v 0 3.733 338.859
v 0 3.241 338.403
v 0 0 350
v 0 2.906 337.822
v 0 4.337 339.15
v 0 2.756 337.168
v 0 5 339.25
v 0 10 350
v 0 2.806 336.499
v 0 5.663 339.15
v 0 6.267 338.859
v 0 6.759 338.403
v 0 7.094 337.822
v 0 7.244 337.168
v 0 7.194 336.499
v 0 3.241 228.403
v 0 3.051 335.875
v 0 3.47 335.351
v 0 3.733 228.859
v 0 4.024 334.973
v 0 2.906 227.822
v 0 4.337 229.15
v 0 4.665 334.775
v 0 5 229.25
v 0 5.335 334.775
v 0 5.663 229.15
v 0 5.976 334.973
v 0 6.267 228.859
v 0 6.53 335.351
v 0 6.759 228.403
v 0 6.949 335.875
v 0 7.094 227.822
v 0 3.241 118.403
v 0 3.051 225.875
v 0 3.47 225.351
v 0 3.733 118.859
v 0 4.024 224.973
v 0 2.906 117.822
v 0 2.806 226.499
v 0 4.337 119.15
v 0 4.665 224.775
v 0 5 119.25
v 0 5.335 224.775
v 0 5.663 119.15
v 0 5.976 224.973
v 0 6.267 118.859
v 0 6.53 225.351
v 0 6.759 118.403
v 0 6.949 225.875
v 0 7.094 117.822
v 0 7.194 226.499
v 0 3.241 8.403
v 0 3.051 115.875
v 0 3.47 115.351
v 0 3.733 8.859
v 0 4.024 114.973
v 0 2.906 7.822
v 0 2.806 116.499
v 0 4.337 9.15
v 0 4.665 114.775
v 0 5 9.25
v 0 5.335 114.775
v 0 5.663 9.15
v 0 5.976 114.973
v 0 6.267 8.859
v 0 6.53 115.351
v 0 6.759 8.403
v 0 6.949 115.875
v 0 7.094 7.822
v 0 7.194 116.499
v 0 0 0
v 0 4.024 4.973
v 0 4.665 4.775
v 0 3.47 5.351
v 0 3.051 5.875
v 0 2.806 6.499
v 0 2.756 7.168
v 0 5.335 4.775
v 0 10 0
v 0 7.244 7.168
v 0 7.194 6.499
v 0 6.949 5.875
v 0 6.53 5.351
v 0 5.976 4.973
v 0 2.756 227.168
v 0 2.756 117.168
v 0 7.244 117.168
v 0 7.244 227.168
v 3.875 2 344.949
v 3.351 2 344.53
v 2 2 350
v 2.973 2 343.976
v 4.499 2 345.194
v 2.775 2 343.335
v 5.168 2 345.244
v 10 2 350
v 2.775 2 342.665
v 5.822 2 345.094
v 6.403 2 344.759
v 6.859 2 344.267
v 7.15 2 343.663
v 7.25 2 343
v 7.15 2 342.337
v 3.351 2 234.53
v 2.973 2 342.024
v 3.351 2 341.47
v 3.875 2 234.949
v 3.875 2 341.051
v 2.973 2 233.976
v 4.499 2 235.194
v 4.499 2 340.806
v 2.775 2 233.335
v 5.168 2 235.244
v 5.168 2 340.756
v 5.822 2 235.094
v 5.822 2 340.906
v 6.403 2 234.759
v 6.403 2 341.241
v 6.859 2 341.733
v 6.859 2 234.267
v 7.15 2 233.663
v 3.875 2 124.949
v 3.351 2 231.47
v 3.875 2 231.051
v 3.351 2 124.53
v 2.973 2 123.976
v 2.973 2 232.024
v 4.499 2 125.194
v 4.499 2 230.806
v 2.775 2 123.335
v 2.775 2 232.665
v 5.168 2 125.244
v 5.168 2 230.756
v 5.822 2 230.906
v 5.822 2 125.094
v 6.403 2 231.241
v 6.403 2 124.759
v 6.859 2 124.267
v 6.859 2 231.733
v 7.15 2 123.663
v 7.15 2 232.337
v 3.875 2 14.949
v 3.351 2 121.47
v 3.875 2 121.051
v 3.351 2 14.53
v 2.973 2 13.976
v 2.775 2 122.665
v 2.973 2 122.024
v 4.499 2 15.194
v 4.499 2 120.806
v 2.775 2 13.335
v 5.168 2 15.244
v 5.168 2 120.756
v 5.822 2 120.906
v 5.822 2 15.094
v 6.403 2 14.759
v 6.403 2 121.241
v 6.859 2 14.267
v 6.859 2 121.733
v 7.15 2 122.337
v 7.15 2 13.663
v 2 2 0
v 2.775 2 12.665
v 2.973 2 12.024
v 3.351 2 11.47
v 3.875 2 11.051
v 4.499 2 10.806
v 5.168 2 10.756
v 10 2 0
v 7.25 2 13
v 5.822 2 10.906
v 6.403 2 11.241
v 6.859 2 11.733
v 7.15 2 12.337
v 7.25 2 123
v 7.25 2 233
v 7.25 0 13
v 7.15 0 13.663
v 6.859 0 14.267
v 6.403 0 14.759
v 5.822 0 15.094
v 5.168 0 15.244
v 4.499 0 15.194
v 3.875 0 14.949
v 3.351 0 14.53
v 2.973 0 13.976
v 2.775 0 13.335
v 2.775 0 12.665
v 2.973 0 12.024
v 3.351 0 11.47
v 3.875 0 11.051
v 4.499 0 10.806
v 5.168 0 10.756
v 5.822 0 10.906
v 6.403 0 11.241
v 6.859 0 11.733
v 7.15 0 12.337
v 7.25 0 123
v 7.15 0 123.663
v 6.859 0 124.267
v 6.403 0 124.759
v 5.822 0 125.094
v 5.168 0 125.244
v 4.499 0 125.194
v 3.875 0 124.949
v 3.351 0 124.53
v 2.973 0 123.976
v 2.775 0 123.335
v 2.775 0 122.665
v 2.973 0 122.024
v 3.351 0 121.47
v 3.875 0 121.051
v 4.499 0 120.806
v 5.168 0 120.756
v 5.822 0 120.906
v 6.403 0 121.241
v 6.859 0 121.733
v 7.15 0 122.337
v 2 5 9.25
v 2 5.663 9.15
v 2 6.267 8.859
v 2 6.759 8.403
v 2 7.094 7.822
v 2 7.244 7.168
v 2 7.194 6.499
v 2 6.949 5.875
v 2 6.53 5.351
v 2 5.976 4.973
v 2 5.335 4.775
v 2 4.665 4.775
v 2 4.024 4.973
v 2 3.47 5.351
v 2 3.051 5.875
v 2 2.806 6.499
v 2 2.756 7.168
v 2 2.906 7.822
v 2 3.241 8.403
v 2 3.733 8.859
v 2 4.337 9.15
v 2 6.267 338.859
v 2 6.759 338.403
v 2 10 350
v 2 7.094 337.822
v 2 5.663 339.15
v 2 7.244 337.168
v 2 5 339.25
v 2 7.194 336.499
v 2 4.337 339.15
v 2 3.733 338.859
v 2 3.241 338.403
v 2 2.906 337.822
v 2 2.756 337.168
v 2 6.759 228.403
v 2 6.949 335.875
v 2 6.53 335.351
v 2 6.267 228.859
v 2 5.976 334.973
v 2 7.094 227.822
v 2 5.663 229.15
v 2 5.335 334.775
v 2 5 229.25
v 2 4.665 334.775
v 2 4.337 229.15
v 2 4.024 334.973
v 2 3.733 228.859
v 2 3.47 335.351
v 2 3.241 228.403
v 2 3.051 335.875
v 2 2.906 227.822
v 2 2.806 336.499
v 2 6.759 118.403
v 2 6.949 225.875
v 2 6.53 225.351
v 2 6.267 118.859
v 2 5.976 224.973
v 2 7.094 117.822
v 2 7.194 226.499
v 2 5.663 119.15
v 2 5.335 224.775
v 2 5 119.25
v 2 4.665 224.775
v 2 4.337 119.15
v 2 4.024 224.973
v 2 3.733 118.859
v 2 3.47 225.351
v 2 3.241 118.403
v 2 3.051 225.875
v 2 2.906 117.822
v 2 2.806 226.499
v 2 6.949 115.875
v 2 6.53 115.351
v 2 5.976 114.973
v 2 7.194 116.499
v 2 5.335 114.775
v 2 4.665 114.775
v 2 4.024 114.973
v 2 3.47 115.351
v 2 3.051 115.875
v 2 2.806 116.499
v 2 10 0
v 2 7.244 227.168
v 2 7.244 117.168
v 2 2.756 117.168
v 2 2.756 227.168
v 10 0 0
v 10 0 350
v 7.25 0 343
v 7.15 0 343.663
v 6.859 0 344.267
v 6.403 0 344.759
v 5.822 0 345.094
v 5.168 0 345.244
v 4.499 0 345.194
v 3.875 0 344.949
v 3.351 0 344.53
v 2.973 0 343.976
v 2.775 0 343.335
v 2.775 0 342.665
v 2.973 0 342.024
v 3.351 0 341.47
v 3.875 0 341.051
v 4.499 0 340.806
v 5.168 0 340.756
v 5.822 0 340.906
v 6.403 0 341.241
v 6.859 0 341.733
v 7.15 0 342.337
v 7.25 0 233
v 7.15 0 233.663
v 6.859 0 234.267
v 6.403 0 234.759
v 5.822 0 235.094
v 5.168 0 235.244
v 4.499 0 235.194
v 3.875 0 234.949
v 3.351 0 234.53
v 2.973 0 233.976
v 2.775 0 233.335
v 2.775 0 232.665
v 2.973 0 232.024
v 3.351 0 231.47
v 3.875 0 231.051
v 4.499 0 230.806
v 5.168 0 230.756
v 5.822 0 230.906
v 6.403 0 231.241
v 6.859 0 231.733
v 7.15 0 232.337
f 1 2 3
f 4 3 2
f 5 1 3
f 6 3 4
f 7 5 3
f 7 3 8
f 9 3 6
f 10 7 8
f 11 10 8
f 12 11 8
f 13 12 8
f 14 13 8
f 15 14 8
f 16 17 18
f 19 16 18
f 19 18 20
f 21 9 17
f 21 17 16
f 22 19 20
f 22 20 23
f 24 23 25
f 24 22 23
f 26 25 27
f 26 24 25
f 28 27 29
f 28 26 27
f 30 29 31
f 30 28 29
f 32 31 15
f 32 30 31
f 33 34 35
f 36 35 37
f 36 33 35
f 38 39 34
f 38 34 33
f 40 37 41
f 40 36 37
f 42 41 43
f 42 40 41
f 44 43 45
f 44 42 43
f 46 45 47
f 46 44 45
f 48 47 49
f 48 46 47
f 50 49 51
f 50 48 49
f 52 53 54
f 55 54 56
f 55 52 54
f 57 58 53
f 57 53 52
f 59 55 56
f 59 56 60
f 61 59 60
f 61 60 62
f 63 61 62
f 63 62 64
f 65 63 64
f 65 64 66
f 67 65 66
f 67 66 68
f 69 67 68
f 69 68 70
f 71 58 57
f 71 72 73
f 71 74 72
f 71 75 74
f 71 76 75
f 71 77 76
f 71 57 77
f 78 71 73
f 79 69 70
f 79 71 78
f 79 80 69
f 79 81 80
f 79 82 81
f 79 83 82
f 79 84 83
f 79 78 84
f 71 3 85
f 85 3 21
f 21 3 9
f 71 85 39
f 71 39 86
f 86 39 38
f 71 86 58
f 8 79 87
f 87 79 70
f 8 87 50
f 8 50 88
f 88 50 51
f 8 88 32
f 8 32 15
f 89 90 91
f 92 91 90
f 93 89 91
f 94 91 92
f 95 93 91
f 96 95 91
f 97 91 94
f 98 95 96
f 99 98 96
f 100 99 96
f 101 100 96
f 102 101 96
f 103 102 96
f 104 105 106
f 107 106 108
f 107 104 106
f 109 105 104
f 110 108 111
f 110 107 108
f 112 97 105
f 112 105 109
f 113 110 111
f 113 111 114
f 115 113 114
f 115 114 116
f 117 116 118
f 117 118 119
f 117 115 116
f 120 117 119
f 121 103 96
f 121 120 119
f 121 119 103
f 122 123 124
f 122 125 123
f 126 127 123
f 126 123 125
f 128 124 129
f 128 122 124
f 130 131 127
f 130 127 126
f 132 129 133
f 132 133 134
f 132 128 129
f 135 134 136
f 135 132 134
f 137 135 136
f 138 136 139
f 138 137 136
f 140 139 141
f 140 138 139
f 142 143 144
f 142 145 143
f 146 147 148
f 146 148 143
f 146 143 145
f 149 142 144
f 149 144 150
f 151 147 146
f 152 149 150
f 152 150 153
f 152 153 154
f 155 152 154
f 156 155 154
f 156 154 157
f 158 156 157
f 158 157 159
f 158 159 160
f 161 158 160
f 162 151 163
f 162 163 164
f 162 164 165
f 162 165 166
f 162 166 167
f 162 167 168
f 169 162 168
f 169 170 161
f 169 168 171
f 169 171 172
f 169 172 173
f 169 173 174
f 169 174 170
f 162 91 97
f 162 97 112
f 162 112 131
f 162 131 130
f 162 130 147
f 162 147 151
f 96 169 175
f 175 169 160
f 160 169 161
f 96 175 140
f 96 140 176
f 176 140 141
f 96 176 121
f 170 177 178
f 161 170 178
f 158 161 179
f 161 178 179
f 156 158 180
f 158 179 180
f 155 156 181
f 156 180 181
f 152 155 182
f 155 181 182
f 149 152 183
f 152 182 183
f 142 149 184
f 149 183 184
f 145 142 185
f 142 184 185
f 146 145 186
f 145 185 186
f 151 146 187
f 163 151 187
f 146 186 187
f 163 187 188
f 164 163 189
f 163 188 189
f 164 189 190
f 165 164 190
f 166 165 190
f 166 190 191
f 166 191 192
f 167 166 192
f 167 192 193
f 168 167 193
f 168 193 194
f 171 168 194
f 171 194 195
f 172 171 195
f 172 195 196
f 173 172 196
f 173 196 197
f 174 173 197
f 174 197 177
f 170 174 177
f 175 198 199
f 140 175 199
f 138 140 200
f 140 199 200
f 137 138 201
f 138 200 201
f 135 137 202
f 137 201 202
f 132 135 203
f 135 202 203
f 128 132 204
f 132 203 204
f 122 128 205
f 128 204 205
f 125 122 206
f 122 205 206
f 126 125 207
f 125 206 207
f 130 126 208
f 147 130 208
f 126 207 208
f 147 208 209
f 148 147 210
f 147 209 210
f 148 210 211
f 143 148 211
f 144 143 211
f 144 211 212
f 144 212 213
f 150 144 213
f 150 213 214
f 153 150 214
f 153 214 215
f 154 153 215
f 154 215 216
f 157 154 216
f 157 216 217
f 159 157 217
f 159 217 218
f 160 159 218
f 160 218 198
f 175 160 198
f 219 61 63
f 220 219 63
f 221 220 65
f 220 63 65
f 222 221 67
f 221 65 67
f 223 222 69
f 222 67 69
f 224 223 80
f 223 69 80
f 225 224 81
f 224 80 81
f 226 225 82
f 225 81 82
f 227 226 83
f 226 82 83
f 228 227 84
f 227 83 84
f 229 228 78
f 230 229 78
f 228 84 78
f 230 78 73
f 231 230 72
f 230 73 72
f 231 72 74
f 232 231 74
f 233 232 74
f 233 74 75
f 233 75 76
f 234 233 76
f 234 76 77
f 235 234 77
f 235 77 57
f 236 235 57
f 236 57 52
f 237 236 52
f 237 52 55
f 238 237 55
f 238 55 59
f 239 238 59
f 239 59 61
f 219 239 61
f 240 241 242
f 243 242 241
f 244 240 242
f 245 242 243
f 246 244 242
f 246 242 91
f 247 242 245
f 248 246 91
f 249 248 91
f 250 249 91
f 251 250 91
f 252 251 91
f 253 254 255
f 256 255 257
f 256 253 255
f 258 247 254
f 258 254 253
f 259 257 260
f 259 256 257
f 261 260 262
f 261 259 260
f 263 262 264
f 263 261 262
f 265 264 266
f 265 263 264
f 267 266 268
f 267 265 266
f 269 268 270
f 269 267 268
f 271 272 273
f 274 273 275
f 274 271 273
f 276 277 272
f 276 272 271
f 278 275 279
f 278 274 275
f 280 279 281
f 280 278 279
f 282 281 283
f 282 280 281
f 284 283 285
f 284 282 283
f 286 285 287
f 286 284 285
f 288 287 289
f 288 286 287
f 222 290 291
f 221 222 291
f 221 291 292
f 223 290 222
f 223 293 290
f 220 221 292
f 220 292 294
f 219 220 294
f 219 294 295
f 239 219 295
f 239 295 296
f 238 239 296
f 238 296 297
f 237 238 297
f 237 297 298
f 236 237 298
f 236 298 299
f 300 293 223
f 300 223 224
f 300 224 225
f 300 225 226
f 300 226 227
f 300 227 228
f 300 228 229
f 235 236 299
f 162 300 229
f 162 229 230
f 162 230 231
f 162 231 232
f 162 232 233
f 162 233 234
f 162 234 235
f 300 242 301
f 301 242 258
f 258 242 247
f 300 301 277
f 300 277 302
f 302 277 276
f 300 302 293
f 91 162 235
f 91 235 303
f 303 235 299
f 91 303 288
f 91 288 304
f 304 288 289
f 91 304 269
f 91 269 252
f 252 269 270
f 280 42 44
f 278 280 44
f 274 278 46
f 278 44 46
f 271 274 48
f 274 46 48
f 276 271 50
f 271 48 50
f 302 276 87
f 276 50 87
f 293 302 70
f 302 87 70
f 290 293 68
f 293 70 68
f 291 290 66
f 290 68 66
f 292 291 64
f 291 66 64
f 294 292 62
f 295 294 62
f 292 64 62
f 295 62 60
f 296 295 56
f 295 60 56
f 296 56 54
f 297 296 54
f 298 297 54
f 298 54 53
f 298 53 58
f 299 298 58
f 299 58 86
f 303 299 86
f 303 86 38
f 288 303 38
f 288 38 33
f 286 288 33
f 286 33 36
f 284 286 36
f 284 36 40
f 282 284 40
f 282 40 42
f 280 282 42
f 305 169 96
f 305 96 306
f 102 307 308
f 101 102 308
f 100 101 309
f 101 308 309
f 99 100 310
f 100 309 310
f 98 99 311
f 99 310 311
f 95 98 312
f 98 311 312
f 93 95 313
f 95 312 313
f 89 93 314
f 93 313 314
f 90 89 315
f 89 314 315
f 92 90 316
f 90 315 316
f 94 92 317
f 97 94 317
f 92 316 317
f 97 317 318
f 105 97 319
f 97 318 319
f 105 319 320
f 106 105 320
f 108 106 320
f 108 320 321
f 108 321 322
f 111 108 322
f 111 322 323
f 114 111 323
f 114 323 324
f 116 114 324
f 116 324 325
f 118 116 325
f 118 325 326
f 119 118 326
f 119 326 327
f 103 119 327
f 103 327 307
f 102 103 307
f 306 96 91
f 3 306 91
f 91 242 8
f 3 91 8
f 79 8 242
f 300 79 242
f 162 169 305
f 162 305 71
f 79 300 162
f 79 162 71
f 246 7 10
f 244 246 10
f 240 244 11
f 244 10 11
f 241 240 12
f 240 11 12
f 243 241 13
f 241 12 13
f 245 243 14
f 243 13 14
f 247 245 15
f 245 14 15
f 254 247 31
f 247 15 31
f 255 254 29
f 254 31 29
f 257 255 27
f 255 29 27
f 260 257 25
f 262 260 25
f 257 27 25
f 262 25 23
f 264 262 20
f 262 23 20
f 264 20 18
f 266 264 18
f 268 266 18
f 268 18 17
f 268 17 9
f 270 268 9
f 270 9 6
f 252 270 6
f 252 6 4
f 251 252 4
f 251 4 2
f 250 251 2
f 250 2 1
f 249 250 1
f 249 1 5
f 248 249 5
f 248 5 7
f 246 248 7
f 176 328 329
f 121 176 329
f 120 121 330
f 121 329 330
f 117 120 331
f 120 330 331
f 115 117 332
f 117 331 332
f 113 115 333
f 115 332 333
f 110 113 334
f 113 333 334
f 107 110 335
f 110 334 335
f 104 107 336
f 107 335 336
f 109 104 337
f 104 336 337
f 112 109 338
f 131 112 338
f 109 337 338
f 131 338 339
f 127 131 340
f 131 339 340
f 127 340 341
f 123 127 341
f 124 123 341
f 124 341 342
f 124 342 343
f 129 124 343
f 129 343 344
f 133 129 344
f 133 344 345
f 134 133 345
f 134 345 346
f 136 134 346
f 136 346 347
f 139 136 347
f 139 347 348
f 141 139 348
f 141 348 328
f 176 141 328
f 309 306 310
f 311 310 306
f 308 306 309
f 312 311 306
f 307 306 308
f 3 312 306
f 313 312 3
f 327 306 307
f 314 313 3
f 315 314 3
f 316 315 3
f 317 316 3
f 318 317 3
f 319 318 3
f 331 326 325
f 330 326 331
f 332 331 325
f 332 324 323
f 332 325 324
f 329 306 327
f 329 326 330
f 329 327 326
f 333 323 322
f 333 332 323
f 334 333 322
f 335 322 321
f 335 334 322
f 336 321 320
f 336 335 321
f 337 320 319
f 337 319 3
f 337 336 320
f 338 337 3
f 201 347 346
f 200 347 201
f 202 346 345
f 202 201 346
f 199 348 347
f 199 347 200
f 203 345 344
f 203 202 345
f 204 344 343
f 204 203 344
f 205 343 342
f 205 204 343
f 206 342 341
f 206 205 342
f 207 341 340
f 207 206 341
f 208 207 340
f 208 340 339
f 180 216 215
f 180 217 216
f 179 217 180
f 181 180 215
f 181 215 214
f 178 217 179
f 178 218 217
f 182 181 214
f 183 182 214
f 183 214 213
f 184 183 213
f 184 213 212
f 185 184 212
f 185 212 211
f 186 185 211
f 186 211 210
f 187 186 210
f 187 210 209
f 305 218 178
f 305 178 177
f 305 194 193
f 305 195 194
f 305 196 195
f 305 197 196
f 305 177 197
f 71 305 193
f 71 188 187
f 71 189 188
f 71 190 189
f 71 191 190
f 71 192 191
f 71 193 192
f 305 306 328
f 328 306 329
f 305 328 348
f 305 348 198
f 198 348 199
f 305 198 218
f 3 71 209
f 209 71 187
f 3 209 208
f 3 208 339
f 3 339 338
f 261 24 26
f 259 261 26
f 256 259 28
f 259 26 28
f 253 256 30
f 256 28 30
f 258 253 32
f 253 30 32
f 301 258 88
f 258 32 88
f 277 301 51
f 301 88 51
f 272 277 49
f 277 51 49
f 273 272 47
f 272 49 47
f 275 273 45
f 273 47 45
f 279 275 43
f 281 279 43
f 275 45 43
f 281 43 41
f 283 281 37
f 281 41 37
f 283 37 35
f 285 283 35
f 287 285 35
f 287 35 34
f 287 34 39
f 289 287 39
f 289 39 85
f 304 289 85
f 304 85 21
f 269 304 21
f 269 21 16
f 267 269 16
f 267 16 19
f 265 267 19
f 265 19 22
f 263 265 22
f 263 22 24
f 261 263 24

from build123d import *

# Parameters (mm, degrees)
EXTRUDE_1_DEPTH     = 350
SKETCH_2_R          = 2.25
CUT_EXTRUDE_1_DEPTH = 11
CUT_EXTRUDE_2_REACH = 12
SKETCH_3_R          = 2.25


with BuildPart() as part:
    # Эскиз1 → Бобышка-Вытянуть1 (new body)
    with BuildSketch(Plane.XY):
        Polygon((0, 0), (0, 10), (2, 10), (2, 2), (10, 2), (10, 0), align=None)
    extrude(amount=EXTRUDE_1_DEPTH)

    # Эскиз2 → Вырез-Вытянуть1 (cut, through all)
    with BuildSketch(Plane.ZY):
        with Locations((7, 5)):
            Circle(SKETCH_2_R)
        with Locations((117, 5)):
            Circle(SKETCH_2_R)
        with Locations((227, 5)):
            Circle(SKETCH_2_R)
        with Locations((337, 5)):
            Circle(SKETCH_2_R)
    extrude(amount=-CUT_EXTRUDE_1_DEPTH, mode=Mode.SUBTRACT)

    # Эскиз3 → Вырез-Вытянуть2 (cut, up to next)
    with BuildSketch(Plane.XZ, mode=Mode.PRIVATE) as cut_extrude_2_sk1:
        with Locations((5, 343)):
            Circle(SKETCH_3_R)
    cut_extrude_2_tool1 = extrude(cut_extrude_2_sk1.sketch, amount=-CUT_EXTRUDE_2_REACH, mode=Mode.PRIVATE) & part.part
    add(cut_extrude_2_tool1.solids().sort_by_distance((5, 0, 343))[0], mode=Mode.SUBTRACT)
    # Эскиз3 → Вырез-Вытянуть2 (cut, up to next)
    with BuildSketch(Plane.XZ, mode=Mode.PRIVATE) as cut_extrude_2_sk2:
        with Locations((5, 233)):
            Circle(SKETCH_3_R)
    cut_extrude_2_tool2 = extrude(cut_extrude_2_sk2.sketch, amount=-CUT_EXTRUDE_2_REACH, mode=Mode.PRIVATE) & part.part
    add(cut_extrude_2_tool2.solids().sort_by_distance((5, 0, 233))[0], mode=Mode.SUBTRACT)
    # Эскиз3 → Вырез-Вытянуть2 (cut, up to next)
    with BuildSketch(Plane.XZ, mode=Mode.PRIVATE) as cut_extrude_2_sk3:
        with Locations((5, 123)):
            Circle(SKETCH_3_R)
    cut_extrude_2_tool3 = extrude(cut_extrude_2_sk3.sketch, amount=-CUT_EXTRUDE_2_REACH, mode=Mode.PRIVATE) & part.part
    add(cut_extrude_2_tool3.solids().sort_by_distance((5, 0, 123))[0], mode=Mode.SUBTRACT)
    # Эскиз3 → Вырез-Вытянуть2 (cut, up to next)
    with BuildSketch(Plane.XZ, mode=Mode.PRIVATE) as cut_extrude_2_sk4:
        with Locations((5, 13)):
            Circle(SKETCH_3_R)
    cut_extrude_2_tool4 = extrude(cut_extrude_2_sk4.sketch, amount=-CUT_EXTRUDE_2_REACH, mode=Mode.PRIVATE) & part.part
    add(cut_extrude_2_tool4.solids().sort_by_distance((5, 0, 13))[0], mode=Mode.SUBTRACT)


solid = part.part
